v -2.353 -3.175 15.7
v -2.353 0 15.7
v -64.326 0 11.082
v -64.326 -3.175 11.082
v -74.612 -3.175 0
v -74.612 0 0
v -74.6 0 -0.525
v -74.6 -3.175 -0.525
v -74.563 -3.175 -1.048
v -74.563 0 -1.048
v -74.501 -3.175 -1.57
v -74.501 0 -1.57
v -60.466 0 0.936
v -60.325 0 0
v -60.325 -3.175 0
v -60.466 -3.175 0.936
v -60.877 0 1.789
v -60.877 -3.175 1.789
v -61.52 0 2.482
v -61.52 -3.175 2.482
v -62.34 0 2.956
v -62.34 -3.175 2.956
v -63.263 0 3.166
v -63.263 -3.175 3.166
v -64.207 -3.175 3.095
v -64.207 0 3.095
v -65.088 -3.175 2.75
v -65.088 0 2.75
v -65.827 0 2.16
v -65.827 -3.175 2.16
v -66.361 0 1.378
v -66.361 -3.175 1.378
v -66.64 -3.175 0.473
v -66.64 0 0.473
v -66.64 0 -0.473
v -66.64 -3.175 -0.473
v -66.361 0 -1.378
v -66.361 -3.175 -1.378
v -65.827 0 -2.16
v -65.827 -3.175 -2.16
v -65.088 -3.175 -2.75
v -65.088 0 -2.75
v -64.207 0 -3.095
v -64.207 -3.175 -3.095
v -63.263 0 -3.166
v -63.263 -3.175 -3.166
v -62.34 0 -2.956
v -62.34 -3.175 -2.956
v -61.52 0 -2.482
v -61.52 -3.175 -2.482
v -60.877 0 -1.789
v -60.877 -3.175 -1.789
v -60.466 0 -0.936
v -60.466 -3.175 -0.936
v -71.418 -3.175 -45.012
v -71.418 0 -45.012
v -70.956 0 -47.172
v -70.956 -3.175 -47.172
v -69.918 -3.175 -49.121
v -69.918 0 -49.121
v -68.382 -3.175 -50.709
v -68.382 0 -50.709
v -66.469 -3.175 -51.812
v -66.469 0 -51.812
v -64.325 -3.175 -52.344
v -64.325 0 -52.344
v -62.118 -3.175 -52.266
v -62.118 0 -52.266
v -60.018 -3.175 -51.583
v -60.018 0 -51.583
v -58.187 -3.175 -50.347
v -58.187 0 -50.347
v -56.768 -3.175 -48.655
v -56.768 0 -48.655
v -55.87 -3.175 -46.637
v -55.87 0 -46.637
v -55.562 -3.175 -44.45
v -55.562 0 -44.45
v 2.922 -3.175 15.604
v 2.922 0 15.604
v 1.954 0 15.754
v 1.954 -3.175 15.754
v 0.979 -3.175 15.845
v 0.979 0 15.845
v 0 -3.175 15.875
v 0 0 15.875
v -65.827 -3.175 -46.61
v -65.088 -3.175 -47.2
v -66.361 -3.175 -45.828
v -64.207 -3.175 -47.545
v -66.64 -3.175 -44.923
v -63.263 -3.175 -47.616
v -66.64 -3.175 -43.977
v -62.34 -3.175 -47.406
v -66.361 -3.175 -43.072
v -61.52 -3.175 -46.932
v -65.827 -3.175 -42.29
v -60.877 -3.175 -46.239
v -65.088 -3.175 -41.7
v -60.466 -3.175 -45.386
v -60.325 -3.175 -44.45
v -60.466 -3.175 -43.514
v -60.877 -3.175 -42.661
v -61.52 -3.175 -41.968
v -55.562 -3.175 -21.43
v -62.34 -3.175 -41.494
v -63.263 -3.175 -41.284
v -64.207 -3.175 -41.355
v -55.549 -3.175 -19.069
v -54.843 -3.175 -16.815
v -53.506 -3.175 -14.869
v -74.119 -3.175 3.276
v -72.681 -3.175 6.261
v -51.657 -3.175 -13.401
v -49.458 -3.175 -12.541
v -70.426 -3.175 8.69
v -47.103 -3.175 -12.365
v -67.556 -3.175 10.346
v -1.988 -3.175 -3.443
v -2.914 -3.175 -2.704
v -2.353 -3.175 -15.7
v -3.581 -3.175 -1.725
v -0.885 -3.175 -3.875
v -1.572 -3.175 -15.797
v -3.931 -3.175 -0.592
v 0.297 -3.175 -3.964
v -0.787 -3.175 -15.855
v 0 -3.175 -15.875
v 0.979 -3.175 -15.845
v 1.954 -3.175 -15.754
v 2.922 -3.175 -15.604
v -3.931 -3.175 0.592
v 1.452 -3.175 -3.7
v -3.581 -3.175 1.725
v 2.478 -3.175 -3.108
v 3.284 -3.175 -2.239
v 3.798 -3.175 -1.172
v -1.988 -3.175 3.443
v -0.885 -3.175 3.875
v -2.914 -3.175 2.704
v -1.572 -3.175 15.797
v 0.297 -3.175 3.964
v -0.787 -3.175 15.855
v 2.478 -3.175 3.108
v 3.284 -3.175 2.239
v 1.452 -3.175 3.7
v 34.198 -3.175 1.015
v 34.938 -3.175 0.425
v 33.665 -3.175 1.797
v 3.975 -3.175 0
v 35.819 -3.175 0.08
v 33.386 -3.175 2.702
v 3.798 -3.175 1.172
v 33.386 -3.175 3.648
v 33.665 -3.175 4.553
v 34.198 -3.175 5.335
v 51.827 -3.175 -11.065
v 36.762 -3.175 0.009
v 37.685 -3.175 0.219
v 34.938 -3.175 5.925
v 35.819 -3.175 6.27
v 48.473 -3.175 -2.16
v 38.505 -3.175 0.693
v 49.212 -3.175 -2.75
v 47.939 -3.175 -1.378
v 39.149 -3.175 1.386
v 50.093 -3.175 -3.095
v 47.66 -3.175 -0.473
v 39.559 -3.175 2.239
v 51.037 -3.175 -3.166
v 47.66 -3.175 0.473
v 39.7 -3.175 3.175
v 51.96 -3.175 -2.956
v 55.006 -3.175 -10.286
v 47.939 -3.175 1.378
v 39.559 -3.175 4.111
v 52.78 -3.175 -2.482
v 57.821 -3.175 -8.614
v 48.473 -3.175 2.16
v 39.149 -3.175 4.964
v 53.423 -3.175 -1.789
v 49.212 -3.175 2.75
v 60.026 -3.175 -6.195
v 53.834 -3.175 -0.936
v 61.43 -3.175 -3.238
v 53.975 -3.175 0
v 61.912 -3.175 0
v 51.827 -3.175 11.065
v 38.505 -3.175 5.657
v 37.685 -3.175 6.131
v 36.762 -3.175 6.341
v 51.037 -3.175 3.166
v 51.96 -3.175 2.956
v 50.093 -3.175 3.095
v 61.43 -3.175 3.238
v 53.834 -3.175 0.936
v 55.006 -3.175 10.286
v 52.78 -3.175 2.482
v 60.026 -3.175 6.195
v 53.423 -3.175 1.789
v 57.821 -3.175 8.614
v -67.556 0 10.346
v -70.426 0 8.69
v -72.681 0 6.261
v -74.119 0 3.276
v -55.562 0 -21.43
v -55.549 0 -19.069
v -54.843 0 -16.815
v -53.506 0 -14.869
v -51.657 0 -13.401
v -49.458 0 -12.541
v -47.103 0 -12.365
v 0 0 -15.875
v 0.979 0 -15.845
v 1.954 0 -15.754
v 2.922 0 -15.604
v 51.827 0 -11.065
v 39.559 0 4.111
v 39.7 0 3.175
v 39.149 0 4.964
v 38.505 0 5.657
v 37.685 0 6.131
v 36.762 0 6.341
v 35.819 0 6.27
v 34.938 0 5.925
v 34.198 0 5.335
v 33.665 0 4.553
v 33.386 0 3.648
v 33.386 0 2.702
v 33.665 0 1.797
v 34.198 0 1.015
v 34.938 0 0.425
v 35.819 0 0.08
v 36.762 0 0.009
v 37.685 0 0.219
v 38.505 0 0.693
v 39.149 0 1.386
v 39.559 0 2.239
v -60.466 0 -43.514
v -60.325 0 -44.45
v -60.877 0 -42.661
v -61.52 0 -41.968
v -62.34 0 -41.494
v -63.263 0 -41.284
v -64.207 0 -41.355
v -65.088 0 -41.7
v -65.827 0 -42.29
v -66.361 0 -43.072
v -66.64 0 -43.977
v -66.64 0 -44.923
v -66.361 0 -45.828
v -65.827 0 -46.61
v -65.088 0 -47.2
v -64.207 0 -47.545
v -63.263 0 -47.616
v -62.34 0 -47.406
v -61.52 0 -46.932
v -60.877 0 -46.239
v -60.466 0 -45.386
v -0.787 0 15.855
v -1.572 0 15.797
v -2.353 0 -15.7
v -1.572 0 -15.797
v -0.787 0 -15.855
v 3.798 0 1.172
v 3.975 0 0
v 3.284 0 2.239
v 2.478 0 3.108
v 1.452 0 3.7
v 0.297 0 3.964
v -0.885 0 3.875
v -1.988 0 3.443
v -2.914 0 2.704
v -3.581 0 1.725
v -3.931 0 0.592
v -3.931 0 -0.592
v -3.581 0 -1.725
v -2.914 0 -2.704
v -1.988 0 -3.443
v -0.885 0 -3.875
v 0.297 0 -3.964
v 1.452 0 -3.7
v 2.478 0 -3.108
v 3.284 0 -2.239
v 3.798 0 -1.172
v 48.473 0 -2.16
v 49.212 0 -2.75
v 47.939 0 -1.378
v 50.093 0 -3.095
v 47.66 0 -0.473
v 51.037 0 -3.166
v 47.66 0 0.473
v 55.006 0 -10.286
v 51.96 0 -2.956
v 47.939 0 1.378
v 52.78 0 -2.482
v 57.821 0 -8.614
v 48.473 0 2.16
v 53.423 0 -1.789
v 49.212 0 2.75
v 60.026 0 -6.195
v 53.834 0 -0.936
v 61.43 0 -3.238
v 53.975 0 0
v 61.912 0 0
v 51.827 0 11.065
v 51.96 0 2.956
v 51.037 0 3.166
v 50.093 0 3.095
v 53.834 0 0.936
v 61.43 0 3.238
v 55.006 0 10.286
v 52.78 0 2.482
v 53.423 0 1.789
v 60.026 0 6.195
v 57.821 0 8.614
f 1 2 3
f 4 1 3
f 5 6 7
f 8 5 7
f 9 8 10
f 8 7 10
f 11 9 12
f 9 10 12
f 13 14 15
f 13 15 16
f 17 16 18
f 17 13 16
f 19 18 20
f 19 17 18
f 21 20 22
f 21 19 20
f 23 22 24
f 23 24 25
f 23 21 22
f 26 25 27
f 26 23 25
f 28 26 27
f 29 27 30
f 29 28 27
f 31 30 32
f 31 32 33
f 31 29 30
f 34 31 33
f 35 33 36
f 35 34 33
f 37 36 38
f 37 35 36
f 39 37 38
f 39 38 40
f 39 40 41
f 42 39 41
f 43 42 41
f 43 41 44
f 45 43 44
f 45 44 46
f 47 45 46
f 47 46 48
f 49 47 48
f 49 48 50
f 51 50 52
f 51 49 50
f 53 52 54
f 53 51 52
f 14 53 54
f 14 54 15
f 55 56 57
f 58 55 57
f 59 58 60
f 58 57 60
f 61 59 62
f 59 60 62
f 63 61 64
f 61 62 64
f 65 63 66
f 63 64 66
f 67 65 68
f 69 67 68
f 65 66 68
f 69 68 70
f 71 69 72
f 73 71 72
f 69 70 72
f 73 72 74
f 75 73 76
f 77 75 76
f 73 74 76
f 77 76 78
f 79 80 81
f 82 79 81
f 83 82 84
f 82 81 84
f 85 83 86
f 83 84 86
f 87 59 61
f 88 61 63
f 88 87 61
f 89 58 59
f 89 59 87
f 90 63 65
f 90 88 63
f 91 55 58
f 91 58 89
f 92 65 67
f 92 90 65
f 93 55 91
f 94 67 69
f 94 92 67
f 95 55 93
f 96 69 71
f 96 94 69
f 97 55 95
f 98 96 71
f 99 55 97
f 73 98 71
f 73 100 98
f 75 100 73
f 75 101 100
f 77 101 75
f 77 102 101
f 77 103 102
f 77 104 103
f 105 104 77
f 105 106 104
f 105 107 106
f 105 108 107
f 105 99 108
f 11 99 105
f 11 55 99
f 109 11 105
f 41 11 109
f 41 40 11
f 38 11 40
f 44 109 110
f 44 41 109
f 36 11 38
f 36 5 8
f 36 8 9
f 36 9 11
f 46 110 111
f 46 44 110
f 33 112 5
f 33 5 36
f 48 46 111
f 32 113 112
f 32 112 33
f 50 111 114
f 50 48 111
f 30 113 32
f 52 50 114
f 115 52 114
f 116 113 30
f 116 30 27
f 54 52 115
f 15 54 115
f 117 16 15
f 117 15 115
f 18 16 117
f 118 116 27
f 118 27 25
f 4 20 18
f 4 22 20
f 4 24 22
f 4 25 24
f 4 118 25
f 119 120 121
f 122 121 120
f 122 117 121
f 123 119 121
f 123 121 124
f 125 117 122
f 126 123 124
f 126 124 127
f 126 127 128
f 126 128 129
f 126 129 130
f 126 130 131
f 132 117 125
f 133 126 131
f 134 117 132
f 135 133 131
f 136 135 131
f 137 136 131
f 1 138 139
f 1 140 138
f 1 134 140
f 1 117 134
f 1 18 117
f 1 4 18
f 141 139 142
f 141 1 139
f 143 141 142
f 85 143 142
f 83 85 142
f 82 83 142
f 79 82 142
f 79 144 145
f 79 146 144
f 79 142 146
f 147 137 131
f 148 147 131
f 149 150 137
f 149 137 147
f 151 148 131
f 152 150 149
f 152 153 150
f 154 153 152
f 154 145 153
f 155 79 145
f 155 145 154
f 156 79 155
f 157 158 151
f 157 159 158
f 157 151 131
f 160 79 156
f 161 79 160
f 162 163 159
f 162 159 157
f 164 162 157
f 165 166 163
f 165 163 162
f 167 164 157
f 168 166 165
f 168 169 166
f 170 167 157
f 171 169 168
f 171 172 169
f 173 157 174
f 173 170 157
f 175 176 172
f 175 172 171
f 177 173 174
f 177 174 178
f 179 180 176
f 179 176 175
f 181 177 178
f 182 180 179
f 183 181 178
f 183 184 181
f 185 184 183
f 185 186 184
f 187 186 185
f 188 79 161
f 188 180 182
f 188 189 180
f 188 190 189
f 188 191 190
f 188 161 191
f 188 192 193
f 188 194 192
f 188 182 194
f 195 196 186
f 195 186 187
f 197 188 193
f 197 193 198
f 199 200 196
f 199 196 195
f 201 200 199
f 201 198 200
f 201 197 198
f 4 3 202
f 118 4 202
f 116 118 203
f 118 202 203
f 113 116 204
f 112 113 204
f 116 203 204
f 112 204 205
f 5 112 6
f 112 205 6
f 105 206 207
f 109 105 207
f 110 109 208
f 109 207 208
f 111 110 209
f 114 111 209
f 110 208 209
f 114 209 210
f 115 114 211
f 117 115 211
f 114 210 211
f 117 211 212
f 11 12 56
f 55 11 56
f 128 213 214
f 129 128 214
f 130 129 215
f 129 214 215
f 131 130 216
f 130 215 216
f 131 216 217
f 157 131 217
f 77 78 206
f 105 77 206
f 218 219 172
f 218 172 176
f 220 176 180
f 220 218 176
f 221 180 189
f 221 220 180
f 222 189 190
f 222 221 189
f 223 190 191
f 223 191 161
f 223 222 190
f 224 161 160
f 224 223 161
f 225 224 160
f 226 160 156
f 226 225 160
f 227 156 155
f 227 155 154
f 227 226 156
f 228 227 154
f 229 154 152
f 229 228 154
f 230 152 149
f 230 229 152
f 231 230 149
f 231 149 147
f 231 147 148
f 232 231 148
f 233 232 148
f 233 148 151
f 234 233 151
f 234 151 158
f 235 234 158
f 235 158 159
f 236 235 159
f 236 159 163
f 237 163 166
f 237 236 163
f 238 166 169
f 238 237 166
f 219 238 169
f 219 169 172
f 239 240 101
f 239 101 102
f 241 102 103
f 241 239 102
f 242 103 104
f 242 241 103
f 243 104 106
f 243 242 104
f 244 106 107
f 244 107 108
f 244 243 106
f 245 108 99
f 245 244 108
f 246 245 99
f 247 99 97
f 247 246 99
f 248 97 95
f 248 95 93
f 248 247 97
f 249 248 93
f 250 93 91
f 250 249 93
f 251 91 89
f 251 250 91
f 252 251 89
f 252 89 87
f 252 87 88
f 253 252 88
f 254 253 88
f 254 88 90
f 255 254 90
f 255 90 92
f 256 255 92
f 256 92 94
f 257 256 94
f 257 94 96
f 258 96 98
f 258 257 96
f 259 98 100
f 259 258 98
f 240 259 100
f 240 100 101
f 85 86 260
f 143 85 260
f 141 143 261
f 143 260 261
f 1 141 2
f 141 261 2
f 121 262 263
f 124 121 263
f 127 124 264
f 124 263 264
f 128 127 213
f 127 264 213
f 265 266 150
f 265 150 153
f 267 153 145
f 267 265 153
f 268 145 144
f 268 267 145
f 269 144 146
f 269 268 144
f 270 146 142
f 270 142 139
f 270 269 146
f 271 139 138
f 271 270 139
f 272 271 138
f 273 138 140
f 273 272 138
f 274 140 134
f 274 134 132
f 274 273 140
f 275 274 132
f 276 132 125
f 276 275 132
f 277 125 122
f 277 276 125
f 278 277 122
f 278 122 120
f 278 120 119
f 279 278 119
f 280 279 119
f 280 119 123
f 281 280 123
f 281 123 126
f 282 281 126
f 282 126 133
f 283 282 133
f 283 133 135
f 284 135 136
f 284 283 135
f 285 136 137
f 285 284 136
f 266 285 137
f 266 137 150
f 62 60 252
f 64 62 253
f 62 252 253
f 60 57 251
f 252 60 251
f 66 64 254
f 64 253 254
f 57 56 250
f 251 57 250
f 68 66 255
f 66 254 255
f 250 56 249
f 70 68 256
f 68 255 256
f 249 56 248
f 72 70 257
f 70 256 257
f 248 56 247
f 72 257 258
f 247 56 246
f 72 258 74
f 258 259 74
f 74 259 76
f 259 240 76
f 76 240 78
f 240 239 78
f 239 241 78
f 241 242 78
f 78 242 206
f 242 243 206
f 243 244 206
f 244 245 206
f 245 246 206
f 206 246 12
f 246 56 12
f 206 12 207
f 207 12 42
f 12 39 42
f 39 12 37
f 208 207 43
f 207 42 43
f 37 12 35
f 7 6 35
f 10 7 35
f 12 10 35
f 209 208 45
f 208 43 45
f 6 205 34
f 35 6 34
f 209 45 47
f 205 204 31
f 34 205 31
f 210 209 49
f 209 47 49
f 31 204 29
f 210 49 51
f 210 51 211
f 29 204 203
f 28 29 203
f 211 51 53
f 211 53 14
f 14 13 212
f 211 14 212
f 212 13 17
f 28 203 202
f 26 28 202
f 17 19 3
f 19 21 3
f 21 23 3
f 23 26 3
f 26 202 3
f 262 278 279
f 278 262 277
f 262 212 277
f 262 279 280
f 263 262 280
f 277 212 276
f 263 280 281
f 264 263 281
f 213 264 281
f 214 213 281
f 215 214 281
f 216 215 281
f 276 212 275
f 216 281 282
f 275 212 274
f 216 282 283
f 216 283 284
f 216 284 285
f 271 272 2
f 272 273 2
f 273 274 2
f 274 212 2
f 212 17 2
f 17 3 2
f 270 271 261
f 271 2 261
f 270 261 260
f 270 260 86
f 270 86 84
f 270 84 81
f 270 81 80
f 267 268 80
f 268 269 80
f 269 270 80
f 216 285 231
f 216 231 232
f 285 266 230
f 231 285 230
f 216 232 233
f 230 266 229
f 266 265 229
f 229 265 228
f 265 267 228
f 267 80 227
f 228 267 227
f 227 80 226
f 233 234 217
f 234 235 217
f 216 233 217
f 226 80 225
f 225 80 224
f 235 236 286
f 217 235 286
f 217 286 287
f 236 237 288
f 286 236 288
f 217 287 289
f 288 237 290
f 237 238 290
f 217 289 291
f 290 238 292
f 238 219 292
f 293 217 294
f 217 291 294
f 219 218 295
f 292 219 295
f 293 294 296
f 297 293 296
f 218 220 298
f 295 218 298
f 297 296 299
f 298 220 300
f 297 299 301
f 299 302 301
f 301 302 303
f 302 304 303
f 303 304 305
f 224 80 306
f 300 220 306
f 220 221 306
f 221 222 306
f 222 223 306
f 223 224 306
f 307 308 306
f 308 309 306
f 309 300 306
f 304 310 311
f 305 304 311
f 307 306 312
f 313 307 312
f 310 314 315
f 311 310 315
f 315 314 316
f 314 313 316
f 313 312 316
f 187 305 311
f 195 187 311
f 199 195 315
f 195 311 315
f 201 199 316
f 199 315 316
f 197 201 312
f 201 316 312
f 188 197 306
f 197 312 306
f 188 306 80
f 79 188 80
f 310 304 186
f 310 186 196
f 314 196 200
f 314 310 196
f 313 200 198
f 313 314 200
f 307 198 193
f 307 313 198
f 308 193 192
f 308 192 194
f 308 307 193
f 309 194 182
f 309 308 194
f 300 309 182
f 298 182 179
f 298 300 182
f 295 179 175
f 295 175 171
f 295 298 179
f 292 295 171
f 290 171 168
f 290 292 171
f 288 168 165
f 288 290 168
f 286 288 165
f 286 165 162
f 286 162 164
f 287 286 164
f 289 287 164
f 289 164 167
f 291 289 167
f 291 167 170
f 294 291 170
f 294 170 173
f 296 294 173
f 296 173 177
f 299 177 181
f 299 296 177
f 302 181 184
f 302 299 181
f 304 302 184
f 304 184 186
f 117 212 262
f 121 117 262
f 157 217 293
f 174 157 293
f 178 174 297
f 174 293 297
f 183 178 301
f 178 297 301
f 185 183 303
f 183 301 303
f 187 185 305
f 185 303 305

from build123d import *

# Parameters (mm, degrees)
F0_R     = 3.9751
F0_R_2   = 3.175
F1_DEPTH = 3.175


with BuildPart() as f1:
    # F0 (on Front) → F1 (new body)
    with BuildSketch(Plane.XZ):
        with BuildLine():
            ThreePointArc((2.9215490166, -15.6038513305), (12.2146472655, -10.1399219514), (15.875, 0))
            ThreePointArc((15.875, 0), (12.2146472655, 10.1399219514), (2.9215490166, 15.6038513305))
            Line((2.9215490166, 15.6038513305), (0, 15.875))
            Line((0, 15.875), (-2.3527821949, 15.6996828294))
            ThreePointArc((-2.3527821949, 15.6996828294), (-15.875, 0), (-2.3527821949, -15.6996828294))
            Line((-2.3527821949, -15.6996828294), (0, -15.875))
            Line((0, -15.875), (2.9215490166, -15.6038513305))
        make_face()
        Circle(F0_R, mode=Mode.SUBTRACT)
        with BuildLine():
            ThreePointArc((2.9215490166, 15.6038513305), (12.2146472655, 10.1399219514), (15.875, 0))
            ThreePointArc((15.875, 0), (12.2146472655, -10.1399219514), (2.9215490166, -15.6038513305))
            Line((2.9215490166, -15.6038513305), (51.8269366371, -11.0649472386))
            ThreePointArc((51.8269366371, -11.0649472386), (39.6875, 0), (51.8269366371, 11.0649472386))
            Line((51.8269366371, 11.0649472386), (2.9215490166, 15.6038513305))
        make_face()
        with Locations((36.5252, 3.175)):
            Circle(F0_R_2, mode=Mode.SUBTRACT)
        with BuildLine():
            Line((0, 15.875), (2.9215490166, 15.6038513305))
            ThreePointArc((2.9215490166, 15.6038513305), (1.4670523387, 15.8070674837), (0, 15.875))
        make_face()
        with BuildLine():
            ThreePointArc((0, -15.875), (1.4670523387, -15.8070674837), (2.9215490166, -15.6038513305))
            Line((2.9215490166, -15.6038513305), (0, -15.875))
        make_face()
        with BuildLine():
            Line((-2.3527821949, 15.6996828294), (0, 15.875))
            ThreePointArc((0, 15.875), (-1.1796525089, 15.8311100356), (-2.3527821949, 15.6996828294))
        make_face()
        with BuildLine():
            ThreePointArc((61.9125, 0), (59.0127793599, 7.4858474093), (51.8269366371, 11.0649472386))
            ThreePointArc((51.8269366371, 11.0649472386), (39.6875, 0), (51.8269366371, -11.0649472386))
            ThreePointArc((51.8269366371, -11.0649472386), (59.0127793599, -7.4858474093), (61.9125, 0))
        make_face()
        with Locations((50.8, 0)):
            Circle(F0_R_2, mode=Mode.SUBTRACT)
        with BuildLine():
            ThreePointArc((-2.3527821949, -15.6996828294), (-1.1796525089, -15.8311100356), (0, -15.875))
            Line((0, -15.875), (-2.3527821949, -15.6996828294))
        make_face()
        with BuildLine():
            ThreePointArc((-2.3527821949, -15.6996828294), (-15.875, 0), (-2.3527821949, 15.6996828294))
            Line((-2.3527821949, 15.6996828294), (-64.3257567562, 11.0817770249))
            ThreePointArc((-64.3257567562, 11.0817770249), (-55.9398599783, 8.1444422216), (-52.3875, 0))
            ThreePointArc((-52.3875, 0), (-62.7132218511, -11.0846125956), (-74.5010903522, -1.5696073753))
            Line((-74.5010903522, -1.5696073753), (-71.4175804254, -45.0119843921))
            ThreePointArc((-71.4175804254, -45.0119843921), (-63.7811686533, -36.5174814568), (-55.5625, -44.45))
            Line((-55.5625, -44.45), (-55.5625, -21.4296542108))
            ThreePointArc((-55.5625, -21.4296542108), (-53.5062463335, -14.8690750057), (-47.1031557359, -12.3651162511))
            Line((-47.1031557359, -12.3651162511), (-2.3527821949, -15.6996828294))
        make_face()
        with BuildLine():
            ThreePointArc((-52.3875, 0), (-55.9398599783, 8.1444422216), (-64.3257567562, 11.0817770249))
            ThreePointArc((-64.3257567562, 11.0817770249), (-71.6444422216, 7.5601400217), (-74.6125, 0))
            Line((-74.6125, 0), (-74.5010903522, -1.5696073753))
            ThreePointArc((-74.5010903522, -1.5696073753), (-62.7132218511, -11.0846125956), (-52.3875, 0))
        make_face()
        with Locations((-63.5, 0)):
            Circle(F0_R_2, mode=Mode.SUBTRACT)
        with BuildLine():
            Line((-74.5010903522, -1.5696073753), (-74.6125, 0))
            ThreePointArc((-74.6125, 0), (-74.5846125956, -0.7867781489), (-74.5010903522, -1.5696073753))
        make_face()
        with BuildLine():
            ThreePointArc((-71.4175804254, -45.0119843921), (-63.2188313467, -52.3825185432), (-55.5625, -44.45))
            ThreePointArc((-55.5625, -44.45), (-63.7811686533, -36.5174814568), (-71.4175804254, -45.0119843921))
        make_face()
        with Locations((-63.5, -44.45)):
            Circle(F0_R_2, mode=Mode.SUBTRACT)
    extrude(amount=F1_DEPTH)


solid = f1.part
